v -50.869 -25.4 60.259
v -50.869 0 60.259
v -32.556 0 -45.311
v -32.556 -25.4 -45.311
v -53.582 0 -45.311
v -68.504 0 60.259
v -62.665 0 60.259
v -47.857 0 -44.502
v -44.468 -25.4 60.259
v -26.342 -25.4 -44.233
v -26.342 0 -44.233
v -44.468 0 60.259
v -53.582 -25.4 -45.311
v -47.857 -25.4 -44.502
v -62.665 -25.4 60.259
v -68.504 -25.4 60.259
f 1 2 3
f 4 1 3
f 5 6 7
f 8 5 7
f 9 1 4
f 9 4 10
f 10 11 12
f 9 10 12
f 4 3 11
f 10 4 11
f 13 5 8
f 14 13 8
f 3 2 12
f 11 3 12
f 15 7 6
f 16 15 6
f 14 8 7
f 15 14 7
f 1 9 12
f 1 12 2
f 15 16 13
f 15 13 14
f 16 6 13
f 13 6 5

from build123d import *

# Parameters (mm, degrees)
F1_DEPTH = 25.4


# Not quite as in the source:
# - the program builds the solid bodies; features that only make, move or delete a surface that nothing else refers to are left out


with BuildPart() as f1:
    # F0 (on Front) → F1 (new body)
    with BuildSketch(Plane.XZ):
        Polygon((-62.6646338144, 60.2588020265), (-68.5038045049, 60.2588020265), (-53.5821802914, -45.3110821545), (-47.8573796931, -44.5019184059), align=None)
    extrude(amount=F1_DEPTH)


with BuildPart() as f1b:
    # F0 (on Front) → F1, piece 2 (new body)
    with BuildSketch(Plane.XZ):
        Polygon((-44.4683302993, 60.2588020265), (-50.8691556752, 60.2588020265), (-32.5562655926, -45.3110821545), (-26.3424197879, -44.2331850241), align=None)
    extrude(amount=F1_DEPTH)


solid = Compound([f1.part, f1b.part])
